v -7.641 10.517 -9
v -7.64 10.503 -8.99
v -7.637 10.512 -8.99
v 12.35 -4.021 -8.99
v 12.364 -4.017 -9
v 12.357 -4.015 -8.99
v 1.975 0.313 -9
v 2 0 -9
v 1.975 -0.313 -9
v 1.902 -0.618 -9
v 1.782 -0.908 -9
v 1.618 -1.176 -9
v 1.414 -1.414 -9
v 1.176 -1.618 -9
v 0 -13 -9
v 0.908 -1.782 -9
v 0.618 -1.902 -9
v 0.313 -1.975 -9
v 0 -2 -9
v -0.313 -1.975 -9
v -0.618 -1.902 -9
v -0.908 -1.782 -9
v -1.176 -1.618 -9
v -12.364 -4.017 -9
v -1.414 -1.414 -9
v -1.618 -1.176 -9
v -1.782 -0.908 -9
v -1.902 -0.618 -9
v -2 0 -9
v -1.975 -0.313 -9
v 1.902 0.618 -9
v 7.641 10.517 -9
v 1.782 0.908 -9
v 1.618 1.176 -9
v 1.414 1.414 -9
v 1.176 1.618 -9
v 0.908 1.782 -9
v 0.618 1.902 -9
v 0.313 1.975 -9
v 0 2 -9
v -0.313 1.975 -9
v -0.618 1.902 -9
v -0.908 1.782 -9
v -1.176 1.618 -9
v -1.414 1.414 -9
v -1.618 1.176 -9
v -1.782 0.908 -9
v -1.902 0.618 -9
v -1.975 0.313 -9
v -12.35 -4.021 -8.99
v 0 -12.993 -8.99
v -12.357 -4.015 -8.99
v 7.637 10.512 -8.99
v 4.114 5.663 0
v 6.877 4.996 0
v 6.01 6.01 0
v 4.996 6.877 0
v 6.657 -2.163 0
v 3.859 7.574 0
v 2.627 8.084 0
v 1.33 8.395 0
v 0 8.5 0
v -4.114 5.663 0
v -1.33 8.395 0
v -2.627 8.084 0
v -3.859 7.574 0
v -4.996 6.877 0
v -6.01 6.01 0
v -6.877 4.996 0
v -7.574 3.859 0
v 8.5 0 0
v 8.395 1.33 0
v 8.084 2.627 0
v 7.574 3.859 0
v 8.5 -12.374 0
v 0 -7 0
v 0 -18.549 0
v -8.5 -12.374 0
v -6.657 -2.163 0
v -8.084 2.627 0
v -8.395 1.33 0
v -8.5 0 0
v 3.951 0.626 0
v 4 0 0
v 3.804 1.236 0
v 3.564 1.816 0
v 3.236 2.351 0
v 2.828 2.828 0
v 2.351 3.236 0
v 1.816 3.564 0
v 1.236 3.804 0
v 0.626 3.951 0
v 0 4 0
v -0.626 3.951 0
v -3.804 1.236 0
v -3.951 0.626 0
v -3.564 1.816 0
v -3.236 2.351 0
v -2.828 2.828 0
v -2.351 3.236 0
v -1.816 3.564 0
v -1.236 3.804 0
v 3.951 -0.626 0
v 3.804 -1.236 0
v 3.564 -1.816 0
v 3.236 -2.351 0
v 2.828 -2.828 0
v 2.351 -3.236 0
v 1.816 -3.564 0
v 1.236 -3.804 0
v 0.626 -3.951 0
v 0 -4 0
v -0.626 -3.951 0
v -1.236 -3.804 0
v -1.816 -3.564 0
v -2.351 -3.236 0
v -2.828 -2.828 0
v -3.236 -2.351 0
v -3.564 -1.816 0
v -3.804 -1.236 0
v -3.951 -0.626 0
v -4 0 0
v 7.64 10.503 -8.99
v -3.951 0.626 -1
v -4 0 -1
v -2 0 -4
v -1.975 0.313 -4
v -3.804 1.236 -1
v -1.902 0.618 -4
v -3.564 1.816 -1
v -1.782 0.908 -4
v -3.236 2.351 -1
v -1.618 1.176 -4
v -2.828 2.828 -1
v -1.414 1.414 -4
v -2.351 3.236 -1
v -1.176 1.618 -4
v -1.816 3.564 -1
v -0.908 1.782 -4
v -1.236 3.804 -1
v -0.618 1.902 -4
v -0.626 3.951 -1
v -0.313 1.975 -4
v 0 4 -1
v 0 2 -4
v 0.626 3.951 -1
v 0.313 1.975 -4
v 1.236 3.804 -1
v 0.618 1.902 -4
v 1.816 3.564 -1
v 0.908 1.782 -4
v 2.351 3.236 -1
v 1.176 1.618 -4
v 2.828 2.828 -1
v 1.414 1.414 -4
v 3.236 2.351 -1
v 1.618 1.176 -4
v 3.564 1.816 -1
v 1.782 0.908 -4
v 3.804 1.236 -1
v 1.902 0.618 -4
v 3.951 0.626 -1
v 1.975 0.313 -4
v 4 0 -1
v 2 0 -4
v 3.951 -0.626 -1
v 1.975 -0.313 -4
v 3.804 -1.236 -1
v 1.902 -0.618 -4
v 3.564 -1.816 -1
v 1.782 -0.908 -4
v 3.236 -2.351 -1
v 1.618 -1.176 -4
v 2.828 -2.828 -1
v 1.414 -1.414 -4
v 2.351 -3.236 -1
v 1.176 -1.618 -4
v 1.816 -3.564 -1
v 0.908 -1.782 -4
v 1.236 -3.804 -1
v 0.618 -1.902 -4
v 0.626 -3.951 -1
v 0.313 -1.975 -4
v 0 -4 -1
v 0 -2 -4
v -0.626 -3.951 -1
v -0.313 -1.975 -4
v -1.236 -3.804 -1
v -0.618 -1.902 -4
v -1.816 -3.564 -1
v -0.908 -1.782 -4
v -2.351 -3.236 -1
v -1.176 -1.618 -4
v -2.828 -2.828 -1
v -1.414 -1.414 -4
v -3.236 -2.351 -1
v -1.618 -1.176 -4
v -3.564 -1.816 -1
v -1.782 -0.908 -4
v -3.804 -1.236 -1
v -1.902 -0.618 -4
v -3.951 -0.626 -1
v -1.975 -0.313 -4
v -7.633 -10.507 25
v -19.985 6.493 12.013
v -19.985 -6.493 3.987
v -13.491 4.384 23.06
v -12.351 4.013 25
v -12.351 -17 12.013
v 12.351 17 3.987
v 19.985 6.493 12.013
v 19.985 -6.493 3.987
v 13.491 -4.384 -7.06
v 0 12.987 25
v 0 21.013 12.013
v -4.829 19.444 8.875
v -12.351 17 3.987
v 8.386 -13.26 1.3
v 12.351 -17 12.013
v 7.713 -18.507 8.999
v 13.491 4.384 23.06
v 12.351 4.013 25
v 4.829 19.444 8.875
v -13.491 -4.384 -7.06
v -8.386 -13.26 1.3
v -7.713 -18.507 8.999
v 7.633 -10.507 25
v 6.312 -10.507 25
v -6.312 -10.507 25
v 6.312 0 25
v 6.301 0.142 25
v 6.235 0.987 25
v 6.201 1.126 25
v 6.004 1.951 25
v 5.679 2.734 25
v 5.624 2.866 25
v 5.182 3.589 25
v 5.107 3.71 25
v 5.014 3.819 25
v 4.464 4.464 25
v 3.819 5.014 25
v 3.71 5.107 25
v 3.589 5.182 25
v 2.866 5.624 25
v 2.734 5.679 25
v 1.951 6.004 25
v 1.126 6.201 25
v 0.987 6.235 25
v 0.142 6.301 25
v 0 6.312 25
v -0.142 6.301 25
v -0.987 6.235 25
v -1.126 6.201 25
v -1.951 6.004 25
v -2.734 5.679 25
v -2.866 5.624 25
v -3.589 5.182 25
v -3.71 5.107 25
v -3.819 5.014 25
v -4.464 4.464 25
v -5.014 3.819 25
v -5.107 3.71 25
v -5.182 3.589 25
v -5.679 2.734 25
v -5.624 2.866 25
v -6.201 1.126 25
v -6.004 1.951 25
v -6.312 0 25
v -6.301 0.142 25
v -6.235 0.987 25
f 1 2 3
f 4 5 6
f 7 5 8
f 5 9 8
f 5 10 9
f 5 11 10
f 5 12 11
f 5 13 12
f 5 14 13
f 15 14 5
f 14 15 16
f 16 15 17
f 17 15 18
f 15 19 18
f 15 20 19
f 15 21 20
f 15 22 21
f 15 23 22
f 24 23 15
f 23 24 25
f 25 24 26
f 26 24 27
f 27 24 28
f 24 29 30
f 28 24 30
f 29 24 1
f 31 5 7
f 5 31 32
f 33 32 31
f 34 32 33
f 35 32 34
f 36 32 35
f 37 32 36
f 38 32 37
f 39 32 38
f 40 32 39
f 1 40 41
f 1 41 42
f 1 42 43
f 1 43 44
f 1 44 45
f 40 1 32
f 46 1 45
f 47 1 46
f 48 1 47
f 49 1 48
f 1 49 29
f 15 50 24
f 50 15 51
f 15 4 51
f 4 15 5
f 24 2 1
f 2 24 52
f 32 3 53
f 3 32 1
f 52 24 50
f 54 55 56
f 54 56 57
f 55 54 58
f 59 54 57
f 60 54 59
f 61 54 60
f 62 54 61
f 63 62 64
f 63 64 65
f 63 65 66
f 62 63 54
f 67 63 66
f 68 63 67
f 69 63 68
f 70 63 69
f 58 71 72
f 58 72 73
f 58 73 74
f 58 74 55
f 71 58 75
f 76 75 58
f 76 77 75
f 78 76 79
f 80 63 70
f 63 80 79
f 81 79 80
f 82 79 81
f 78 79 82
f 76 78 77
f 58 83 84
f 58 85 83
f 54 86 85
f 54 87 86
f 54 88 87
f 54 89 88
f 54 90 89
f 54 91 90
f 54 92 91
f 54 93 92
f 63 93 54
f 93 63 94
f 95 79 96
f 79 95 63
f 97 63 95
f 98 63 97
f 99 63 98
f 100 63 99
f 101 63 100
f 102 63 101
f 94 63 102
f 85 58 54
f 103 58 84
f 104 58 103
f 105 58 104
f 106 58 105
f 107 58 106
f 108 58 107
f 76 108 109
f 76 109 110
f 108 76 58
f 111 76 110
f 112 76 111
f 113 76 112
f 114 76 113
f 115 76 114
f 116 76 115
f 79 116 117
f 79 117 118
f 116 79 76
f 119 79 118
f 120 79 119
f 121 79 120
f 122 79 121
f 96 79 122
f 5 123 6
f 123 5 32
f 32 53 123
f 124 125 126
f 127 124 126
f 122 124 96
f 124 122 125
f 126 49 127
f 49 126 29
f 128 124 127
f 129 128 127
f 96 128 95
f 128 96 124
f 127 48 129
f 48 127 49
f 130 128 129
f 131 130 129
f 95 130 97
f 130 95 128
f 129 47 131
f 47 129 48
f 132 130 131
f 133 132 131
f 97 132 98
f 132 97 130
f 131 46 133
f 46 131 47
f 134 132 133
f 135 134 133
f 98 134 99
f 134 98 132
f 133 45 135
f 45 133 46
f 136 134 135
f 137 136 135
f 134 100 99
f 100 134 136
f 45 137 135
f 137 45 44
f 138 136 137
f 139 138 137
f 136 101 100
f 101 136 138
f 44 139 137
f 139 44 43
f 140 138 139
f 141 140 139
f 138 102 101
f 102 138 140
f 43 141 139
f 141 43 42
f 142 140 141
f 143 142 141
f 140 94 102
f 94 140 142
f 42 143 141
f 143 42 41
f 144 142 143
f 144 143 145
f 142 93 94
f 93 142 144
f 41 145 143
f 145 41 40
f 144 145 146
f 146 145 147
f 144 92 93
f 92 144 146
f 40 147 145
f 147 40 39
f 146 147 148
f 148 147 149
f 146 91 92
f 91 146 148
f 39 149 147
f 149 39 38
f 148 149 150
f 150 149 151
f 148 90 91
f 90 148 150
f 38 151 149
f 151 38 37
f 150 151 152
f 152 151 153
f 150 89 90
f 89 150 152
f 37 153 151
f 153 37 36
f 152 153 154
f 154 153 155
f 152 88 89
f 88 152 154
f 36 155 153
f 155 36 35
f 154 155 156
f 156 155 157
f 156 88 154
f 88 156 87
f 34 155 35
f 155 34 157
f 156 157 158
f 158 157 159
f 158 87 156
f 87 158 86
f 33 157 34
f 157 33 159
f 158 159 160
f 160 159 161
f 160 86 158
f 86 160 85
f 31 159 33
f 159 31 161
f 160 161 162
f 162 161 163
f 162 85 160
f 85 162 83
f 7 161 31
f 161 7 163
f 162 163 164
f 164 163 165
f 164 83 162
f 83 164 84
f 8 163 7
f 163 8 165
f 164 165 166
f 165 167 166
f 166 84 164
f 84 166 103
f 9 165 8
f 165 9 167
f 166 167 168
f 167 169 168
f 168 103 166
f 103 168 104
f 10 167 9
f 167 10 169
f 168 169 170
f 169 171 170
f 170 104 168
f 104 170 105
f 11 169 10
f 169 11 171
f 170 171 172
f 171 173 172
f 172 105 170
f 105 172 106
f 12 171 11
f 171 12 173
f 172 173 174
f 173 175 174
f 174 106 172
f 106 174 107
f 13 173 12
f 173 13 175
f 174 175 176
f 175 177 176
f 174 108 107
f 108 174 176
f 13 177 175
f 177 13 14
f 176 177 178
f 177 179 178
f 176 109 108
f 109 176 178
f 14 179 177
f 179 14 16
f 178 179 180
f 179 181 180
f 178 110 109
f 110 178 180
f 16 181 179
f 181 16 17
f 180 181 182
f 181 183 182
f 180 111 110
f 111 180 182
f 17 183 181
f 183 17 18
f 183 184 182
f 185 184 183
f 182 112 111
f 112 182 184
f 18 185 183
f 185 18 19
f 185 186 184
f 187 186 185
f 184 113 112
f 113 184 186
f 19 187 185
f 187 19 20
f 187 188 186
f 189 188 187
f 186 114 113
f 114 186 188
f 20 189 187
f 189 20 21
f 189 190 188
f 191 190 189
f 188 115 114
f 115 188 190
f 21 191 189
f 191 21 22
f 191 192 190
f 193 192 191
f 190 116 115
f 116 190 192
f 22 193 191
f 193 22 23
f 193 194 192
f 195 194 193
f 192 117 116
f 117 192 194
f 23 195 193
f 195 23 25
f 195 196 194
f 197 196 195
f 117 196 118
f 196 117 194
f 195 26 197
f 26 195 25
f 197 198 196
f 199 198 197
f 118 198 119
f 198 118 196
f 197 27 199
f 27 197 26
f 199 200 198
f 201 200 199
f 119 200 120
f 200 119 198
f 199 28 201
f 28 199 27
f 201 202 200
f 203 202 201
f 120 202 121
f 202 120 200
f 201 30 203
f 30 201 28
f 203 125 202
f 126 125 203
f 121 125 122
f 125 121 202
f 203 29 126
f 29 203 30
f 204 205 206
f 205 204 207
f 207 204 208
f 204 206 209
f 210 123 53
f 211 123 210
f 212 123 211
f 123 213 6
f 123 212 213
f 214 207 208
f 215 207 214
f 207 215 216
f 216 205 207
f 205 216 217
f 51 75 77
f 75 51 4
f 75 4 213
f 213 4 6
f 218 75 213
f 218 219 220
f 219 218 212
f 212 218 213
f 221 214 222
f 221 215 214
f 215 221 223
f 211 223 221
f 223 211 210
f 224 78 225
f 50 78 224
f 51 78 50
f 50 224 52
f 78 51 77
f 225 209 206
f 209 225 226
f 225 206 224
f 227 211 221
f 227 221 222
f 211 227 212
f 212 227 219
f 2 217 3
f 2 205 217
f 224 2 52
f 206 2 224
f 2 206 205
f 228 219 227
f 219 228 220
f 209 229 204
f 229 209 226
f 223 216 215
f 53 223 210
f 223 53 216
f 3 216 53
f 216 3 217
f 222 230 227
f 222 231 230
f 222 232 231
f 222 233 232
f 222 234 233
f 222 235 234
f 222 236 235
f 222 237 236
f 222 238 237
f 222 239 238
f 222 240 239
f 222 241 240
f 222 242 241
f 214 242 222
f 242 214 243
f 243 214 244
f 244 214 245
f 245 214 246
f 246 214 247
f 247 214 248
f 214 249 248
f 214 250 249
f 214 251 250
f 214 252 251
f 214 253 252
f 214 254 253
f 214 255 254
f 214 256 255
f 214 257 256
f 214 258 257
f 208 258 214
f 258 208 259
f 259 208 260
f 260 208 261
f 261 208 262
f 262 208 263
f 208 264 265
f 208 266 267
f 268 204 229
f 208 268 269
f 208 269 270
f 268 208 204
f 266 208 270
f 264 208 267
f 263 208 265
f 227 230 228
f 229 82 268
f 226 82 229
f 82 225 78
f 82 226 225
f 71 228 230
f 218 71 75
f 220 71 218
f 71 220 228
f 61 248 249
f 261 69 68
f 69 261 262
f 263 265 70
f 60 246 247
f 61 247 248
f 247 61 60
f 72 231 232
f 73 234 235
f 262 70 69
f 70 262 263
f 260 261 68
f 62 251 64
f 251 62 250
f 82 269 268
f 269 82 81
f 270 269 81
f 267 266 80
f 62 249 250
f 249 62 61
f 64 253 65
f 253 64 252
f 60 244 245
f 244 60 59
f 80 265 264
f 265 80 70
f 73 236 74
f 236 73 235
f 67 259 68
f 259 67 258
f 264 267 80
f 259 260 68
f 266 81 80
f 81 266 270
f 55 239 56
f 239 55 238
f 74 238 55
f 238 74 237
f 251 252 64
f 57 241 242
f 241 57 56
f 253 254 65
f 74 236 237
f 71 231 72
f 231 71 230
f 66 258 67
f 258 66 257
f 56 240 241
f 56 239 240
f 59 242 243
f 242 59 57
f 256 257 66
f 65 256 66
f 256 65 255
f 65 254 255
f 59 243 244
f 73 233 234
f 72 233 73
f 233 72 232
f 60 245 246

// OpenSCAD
/*
 * Futuristic dodecahedron-shaped toothbrush holder for
 * Jordan SoftClean™ Clean.
 */

// Radius of the toothbrush bottom
brush_bottom = 17;
// Radius of the toothbrush at "height"
brush_top = 12.1;
// Distance between the top and the toothbrush platform
brush_height = 28;
// Extra thickness to add to the bottom
base_thickness = 6;
// Screw hole indentation
screw_indent = 1;
// Screw head radius
screw_top = 8;
// Screw hole radius
screw_bot = 4;
// Screw head height
screw_height = 3;
// No need to change unless you're going to do a BIG one
screw_cutmargin = 5;
// How fine are the circles
$fn = 40;

module box(size) {
    cube([2*size, 2*size, size], center = true); 
}

module dodecahedron(size, ish=false) {
      dihedral = 116.565;
      intersection(){
            box(size);
            intersection_for(i=[1:5])  {
                union() {
                    rotate([dihedral, 0, 360 / 5 * i])  box(size); 
                    if (i==5 && ish) translate([-size,0,-size]) cube([2*size,size,2*size]);
                }
           }
      }
}

module brush_side_profile() {
    polygon([[0,0],[0,brush_height],[brush_top/2,brush_height],[brush_bottom/2,0]]);
}

module brush_base() {
    rotate_extrude() {
        brush_side_profile();
    }
}

// Opening where to push the brush into its place
module opening () {
    rotate([90,0,0]) {
        linear_extrude(brush_height) {
            mirror([90,0,0]) brush_side_profile();
            brush_side_profile();
        }
    }
    // The round hole for the brush
    brush_base();
}

// Just the dodecahedron at correct height
module dode_only() {
    translate([0,0,brush_height/2-base_thickness]) {
        rotate([0,180,0]) {
            dodecahedron(brush_height+base_thickness);
        }
    }
}

// Hole for the screw.
module screwhole() {
    translate([0,0,-screw_indent]) {
        rotate_extrude() {
            polygon([[0,screw_indent],[screw_top/2,screw_indent],[screw_top/2,0],[screw_bot/2,-screw_height],[screw_bot/2,-screw_height-screw_cutmargin], [0,-screw_height-screw_cutmargin]]);
        }
    }
}

// A part which can be printed with 100% infill to make the center of gravity
// lower. In case you want to use it as such without a screw
module bottom_weight() {
    difference () {
        rotate([0,0,54]) mirror([0,0,1])cylinder(9, 7, 13, $fn=5);
        screwhole();
    }
}

// All other parts of the thing excluding the bottom weight.
// Safe to print with 10% gyroid infill.
module the_rest() {
    difference() {
        dode_only();
        opening();
        // This is just a wide hole. The height has some extra margin.
        mirror([0,0,1]) cylinder(2*base_thickness, screw_top/2, screw_top/2);
    }
}

// If you want to print a uniform one, just keep both.
// In case you want to use denser infill in the bottom piece,
// export them as two STLs and import them as a group to your slicer of choice.
bottom_weight();
the_rest();
